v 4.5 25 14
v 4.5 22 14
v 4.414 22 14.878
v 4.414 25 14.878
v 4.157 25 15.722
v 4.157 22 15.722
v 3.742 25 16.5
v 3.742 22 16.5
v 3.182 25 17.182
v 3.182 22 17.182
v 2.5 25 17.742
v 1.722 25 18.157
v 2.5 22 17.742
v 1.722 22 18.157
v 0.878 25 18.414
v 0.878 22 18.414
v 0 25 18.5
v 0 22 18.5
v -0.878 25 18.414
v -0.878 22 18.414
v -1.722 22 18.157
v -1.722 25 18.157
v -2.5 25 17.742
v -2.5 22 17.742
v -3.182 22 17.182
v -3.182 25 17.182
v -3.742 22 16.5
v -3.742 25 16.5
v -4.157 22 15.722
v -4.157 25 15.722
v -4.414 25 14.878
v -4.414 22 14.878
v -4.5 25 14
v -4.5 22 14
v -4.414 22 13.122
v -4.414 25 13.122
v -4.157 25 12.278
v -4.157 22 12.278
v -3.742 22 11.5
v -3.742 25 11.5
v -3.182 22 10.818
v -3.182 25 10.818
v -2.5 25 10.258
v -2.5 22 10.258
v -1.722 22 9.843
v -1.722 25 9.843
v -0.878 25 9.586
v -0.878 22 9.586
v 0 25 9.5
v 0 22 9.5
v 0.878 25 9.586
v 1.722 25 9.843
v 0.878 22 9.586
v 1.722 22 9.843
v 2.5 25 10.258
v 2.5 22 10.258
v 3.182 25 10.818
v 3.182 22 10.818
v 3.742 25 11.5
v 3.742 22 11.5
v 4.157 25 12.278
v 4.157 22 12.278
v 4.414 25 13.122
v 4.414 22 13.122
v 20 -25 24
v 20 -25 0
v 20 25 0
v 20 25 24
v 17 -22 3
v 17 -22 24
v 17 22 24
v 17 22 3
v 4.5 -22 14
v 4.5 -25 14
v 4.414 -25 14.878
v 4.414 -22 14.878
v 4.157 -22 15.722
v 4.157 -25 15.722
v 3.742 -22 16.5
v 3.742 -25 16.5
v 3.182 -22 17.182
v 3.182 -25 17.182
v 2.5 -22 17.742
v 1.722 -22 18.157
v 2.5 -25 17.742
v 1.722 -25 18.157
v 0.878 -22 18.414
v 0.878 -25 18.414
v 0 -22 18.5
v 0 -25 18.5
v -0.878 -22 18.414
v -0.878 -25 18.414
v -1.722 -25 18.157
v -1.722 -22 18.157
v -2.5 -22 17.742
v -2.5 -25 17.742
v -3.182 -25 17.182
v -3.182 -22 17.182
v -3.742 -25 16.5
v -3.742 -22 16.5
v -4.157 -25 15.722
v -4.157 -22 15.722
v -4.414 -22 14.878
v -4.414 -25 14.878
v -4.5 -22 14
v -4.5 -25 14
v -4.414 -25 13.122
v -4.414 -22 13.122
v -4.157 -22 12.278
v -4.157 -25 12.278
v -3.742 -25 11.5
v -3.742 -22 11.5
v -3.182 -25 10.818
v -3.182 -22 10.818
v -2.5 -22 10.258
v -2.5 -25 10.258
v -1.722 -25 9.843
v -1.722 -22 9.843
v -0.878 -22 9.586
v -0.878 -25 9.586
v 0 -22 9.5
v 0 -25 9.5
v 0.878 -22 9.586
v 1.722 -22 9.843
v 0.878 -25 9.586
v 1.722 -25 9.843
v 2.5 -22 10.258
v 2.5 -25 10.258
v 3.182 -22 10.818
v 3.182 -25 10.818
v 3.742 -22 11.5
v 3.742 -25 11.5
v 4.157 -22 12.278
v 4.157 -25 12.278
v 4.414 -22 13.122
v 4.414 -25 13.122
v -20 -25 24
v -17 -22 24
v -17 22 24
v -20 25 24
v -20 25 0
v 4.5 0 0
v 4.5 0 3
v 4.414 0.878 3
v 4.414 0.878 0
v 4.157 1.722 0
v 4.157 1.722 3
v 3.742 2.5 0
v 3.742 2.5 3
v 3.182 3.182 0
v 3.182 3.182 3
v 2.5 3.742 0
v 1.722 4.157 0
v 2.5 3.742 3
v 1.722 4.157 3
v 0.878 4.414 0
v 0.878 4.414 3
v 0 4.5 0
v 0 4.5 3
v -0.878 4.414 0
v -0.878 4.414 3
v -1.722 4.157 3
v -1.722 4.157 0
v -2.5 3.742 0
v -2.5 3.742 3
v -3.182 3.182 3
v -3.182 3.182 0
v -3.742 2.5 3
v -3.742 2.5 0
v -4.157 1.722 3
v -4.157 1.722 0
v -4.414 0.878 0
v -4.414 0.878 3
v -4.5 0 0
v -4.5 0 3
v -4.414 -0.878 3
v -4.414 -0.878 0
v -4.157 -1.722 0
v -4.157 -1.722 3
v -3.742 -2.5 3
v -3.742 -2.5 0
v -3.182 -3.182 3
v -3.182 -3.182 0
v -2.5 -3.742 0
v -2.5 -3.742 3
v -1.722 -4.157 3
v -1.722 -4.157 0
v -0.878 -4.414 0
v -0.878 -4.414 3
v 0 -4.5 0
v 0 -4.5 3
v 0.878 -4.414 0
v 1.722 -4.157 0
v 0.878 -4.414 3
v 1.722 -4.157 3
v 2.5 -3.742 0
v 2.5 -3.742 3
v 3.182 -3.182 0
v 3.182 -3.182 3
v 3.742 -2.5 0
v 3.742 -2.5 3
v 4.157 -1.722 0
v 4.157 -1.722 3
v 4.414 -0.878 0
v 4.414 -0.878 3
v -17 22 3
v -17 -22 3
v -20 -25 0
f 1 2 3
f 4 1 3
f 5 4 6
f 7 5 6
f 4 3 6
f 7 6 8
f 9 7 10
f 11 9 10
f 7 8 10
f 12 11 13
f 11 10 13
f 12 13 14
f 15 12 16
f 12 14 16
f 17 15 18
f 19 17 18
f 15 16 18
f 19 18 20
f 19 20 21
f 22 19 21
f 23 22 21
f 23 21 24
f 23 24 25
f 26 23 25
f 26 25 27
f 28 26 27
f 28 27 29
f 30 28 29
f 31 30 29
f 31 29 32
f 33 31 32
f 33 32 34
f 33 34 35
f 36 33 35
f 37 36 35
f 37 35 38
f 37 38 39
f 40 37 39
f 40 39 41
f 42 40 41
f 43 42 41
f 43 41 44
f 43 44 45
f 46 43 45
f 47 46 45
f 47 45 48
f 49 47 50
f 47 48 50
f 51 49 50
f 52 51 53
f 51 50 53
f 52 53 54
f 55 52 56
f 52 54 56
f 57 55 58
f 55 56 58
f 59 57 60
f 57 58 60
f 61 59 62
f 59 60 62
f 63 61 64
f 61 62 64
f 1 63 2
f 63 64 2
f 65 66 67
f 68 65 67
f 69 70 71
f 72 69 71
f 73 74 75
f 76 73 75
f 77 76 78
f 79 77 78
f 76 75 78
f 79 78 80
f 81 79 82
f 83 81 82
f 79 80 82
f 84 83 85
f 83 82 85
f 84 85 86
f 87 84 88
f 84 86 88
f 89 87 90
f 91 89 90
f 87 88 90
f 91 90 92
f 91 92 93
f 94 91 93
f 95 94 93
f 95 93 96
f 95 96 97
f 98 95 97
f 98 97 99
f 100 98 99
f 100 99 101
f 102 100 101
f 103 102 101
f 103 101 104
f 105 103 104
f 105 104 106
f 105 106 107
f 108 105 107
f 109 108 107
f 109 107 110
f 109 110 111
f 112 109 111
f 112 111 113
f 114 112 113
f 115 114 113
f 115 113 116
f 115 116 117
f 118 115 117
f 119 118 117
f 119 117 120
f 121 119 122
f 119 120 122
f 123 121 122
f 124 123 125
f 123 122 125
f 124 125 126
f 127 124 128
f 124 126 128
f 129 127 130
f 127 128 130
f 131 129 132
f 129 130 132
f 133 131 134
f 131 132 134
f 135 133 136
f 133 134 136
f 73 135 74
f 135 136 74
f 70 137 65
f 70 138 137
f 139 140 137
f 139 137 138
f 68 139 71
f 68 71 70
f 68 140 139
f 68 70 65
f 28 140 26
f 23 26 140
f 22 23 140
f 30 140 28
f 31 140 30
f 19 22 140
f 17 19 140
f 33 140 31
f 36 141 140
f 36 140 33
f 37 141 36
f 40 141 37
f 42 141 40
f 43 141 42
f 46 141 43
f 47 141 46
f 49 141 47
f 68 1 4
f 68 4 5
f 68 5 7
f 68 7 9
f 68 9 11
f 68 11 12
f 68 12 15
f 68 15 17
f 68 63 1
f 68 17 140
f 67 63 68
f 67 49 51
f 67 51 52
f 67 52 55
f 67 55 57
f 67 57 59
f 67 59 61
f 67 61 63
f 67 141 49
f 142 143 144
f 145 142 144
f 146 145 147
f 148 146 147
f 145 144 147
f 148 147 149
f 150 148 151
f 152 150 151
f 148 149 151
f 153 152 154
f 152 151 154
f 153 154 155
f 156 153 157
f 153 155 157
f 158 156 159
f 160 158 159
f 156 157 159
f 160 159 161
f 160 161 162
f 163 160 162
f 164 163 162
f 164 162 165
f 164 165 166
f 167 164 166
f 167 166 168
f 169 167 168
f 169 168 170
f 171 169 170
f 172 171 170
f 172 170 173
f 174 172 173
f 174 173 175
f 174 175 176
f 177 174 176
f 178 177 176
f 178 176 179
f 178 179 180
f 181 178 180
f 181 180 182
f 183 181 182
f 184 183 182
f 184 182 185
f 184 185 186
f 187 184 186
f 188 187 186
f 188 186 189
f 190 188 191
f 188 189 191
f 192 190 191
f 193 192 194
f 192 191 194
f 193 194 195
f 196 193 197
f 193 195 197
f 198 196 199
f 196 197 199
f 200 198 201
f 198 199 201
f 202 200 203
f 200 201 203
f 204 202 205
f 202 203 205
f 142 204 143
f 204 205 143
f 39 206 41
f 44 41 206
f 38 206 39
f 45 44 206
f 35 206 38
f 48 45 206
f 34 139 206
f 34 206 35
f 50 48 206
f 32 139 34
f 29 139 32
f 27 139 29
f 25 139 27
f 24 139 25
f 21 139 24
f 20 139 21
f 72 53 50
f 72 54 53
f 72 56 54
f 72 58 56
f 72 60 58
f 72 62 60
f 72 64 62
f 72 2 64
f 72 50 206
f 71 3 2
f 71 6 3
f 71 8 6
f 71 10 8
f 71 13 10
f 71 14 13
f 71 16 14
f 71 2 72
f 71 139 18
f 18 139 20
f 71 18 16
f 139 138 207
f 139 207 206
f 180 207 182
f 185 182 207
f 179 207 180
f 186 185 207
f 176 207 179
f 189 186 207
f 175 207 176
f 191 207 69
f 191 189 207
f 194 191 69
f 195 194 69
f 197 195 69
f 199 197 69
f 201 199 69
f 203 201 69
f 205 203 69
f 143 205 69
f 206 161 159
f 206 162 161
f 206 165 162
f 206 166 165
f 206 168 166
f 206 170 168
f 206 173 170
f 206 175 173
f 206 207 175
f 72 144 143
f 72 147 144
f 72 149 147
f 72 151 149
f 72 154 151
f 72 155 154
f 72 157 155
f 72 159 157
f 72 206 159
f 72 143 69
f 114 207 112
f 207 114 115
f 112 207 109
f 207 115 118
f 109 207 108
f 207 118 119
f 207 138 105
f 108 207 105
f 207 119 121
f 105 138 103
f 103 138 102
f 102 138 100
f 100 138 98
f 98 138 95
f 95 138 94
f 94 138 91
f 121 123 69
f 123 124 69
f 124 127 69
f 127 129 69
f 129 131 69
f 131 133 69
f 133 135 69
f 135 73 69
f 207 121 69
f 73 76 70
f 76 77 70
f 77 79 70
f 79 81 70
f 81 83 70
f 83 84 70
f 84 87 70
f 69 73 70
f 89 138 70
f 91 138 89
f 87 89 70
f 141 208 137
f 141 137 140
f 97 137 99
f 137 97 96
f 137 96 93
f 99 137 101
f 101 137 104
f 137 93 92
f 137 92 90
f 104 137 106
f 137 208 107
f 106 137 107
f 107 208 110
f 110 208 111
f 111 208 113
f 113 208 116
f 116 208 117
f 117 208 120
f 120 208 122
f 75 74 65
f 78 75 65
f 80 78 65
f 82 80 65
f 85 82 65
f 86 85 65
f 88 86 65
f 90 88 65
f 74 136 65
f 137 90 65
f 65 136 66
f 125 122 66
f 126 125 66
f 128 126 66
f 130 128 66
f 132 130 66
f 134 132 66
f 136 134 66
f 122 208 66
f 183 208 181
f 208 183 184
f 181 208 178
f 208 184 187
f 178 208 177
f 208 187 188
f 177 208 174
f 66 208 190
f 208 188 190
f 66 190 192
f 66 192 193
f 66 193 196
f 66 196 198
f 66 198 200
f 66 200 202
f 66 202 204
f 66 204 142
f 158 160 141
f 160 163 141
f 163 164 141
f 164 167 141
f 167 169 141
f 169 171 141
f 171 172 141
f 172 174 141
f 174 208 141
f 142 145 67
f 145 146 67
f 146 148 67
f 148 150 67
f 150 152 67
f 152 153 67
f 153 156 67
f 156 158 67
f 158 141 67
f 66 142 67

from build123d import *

# Parameters (mm, degrees)
F0_W     = 40
F0_H     = 50
F1_DEPTH = 24
F2_W     = 34
F2_H     = 44
F3_DEPTH = 21
F4_R     = 4.5
F5_DEPTH = 50.001
F6_R     = 4.5
F7_DEPTH = 3.001


with BuildPart() as f1:
    # F0 (on Top) → F1 (new body)
    with BuildSketch(Plane.XY):
        Rectangle(F0_W, F0_H)
    extrude(amount=F1_DEPTH)

    # F2 (on face) → F3 (cut, through all)
    with BuildSketch(Plane.XY.offset(24)):
        Rectangle(F2_W, F2_H)
    extrude(amount=-F3_DEPTH, mode=Mode.SUBTRACT)

    # F4 (on face) → F5 (cut, through all)
    with BuildSketch(Plane.XZ.offset(25)):
        with Locations((0, 14)):
            Circle(F4_R)
    extrude(amount=-F5_DEPTH, mode=Mode.SUBTRACT)

    # F6 (on face) → F7 (cut, through all)
    with BuildSketch(Plane.XY.offset(3)):
        Circle(F6_R)
    extrude(amount=-F7_DEPTH, mode=Mode.SUBTRACT)


solid = f1.part
